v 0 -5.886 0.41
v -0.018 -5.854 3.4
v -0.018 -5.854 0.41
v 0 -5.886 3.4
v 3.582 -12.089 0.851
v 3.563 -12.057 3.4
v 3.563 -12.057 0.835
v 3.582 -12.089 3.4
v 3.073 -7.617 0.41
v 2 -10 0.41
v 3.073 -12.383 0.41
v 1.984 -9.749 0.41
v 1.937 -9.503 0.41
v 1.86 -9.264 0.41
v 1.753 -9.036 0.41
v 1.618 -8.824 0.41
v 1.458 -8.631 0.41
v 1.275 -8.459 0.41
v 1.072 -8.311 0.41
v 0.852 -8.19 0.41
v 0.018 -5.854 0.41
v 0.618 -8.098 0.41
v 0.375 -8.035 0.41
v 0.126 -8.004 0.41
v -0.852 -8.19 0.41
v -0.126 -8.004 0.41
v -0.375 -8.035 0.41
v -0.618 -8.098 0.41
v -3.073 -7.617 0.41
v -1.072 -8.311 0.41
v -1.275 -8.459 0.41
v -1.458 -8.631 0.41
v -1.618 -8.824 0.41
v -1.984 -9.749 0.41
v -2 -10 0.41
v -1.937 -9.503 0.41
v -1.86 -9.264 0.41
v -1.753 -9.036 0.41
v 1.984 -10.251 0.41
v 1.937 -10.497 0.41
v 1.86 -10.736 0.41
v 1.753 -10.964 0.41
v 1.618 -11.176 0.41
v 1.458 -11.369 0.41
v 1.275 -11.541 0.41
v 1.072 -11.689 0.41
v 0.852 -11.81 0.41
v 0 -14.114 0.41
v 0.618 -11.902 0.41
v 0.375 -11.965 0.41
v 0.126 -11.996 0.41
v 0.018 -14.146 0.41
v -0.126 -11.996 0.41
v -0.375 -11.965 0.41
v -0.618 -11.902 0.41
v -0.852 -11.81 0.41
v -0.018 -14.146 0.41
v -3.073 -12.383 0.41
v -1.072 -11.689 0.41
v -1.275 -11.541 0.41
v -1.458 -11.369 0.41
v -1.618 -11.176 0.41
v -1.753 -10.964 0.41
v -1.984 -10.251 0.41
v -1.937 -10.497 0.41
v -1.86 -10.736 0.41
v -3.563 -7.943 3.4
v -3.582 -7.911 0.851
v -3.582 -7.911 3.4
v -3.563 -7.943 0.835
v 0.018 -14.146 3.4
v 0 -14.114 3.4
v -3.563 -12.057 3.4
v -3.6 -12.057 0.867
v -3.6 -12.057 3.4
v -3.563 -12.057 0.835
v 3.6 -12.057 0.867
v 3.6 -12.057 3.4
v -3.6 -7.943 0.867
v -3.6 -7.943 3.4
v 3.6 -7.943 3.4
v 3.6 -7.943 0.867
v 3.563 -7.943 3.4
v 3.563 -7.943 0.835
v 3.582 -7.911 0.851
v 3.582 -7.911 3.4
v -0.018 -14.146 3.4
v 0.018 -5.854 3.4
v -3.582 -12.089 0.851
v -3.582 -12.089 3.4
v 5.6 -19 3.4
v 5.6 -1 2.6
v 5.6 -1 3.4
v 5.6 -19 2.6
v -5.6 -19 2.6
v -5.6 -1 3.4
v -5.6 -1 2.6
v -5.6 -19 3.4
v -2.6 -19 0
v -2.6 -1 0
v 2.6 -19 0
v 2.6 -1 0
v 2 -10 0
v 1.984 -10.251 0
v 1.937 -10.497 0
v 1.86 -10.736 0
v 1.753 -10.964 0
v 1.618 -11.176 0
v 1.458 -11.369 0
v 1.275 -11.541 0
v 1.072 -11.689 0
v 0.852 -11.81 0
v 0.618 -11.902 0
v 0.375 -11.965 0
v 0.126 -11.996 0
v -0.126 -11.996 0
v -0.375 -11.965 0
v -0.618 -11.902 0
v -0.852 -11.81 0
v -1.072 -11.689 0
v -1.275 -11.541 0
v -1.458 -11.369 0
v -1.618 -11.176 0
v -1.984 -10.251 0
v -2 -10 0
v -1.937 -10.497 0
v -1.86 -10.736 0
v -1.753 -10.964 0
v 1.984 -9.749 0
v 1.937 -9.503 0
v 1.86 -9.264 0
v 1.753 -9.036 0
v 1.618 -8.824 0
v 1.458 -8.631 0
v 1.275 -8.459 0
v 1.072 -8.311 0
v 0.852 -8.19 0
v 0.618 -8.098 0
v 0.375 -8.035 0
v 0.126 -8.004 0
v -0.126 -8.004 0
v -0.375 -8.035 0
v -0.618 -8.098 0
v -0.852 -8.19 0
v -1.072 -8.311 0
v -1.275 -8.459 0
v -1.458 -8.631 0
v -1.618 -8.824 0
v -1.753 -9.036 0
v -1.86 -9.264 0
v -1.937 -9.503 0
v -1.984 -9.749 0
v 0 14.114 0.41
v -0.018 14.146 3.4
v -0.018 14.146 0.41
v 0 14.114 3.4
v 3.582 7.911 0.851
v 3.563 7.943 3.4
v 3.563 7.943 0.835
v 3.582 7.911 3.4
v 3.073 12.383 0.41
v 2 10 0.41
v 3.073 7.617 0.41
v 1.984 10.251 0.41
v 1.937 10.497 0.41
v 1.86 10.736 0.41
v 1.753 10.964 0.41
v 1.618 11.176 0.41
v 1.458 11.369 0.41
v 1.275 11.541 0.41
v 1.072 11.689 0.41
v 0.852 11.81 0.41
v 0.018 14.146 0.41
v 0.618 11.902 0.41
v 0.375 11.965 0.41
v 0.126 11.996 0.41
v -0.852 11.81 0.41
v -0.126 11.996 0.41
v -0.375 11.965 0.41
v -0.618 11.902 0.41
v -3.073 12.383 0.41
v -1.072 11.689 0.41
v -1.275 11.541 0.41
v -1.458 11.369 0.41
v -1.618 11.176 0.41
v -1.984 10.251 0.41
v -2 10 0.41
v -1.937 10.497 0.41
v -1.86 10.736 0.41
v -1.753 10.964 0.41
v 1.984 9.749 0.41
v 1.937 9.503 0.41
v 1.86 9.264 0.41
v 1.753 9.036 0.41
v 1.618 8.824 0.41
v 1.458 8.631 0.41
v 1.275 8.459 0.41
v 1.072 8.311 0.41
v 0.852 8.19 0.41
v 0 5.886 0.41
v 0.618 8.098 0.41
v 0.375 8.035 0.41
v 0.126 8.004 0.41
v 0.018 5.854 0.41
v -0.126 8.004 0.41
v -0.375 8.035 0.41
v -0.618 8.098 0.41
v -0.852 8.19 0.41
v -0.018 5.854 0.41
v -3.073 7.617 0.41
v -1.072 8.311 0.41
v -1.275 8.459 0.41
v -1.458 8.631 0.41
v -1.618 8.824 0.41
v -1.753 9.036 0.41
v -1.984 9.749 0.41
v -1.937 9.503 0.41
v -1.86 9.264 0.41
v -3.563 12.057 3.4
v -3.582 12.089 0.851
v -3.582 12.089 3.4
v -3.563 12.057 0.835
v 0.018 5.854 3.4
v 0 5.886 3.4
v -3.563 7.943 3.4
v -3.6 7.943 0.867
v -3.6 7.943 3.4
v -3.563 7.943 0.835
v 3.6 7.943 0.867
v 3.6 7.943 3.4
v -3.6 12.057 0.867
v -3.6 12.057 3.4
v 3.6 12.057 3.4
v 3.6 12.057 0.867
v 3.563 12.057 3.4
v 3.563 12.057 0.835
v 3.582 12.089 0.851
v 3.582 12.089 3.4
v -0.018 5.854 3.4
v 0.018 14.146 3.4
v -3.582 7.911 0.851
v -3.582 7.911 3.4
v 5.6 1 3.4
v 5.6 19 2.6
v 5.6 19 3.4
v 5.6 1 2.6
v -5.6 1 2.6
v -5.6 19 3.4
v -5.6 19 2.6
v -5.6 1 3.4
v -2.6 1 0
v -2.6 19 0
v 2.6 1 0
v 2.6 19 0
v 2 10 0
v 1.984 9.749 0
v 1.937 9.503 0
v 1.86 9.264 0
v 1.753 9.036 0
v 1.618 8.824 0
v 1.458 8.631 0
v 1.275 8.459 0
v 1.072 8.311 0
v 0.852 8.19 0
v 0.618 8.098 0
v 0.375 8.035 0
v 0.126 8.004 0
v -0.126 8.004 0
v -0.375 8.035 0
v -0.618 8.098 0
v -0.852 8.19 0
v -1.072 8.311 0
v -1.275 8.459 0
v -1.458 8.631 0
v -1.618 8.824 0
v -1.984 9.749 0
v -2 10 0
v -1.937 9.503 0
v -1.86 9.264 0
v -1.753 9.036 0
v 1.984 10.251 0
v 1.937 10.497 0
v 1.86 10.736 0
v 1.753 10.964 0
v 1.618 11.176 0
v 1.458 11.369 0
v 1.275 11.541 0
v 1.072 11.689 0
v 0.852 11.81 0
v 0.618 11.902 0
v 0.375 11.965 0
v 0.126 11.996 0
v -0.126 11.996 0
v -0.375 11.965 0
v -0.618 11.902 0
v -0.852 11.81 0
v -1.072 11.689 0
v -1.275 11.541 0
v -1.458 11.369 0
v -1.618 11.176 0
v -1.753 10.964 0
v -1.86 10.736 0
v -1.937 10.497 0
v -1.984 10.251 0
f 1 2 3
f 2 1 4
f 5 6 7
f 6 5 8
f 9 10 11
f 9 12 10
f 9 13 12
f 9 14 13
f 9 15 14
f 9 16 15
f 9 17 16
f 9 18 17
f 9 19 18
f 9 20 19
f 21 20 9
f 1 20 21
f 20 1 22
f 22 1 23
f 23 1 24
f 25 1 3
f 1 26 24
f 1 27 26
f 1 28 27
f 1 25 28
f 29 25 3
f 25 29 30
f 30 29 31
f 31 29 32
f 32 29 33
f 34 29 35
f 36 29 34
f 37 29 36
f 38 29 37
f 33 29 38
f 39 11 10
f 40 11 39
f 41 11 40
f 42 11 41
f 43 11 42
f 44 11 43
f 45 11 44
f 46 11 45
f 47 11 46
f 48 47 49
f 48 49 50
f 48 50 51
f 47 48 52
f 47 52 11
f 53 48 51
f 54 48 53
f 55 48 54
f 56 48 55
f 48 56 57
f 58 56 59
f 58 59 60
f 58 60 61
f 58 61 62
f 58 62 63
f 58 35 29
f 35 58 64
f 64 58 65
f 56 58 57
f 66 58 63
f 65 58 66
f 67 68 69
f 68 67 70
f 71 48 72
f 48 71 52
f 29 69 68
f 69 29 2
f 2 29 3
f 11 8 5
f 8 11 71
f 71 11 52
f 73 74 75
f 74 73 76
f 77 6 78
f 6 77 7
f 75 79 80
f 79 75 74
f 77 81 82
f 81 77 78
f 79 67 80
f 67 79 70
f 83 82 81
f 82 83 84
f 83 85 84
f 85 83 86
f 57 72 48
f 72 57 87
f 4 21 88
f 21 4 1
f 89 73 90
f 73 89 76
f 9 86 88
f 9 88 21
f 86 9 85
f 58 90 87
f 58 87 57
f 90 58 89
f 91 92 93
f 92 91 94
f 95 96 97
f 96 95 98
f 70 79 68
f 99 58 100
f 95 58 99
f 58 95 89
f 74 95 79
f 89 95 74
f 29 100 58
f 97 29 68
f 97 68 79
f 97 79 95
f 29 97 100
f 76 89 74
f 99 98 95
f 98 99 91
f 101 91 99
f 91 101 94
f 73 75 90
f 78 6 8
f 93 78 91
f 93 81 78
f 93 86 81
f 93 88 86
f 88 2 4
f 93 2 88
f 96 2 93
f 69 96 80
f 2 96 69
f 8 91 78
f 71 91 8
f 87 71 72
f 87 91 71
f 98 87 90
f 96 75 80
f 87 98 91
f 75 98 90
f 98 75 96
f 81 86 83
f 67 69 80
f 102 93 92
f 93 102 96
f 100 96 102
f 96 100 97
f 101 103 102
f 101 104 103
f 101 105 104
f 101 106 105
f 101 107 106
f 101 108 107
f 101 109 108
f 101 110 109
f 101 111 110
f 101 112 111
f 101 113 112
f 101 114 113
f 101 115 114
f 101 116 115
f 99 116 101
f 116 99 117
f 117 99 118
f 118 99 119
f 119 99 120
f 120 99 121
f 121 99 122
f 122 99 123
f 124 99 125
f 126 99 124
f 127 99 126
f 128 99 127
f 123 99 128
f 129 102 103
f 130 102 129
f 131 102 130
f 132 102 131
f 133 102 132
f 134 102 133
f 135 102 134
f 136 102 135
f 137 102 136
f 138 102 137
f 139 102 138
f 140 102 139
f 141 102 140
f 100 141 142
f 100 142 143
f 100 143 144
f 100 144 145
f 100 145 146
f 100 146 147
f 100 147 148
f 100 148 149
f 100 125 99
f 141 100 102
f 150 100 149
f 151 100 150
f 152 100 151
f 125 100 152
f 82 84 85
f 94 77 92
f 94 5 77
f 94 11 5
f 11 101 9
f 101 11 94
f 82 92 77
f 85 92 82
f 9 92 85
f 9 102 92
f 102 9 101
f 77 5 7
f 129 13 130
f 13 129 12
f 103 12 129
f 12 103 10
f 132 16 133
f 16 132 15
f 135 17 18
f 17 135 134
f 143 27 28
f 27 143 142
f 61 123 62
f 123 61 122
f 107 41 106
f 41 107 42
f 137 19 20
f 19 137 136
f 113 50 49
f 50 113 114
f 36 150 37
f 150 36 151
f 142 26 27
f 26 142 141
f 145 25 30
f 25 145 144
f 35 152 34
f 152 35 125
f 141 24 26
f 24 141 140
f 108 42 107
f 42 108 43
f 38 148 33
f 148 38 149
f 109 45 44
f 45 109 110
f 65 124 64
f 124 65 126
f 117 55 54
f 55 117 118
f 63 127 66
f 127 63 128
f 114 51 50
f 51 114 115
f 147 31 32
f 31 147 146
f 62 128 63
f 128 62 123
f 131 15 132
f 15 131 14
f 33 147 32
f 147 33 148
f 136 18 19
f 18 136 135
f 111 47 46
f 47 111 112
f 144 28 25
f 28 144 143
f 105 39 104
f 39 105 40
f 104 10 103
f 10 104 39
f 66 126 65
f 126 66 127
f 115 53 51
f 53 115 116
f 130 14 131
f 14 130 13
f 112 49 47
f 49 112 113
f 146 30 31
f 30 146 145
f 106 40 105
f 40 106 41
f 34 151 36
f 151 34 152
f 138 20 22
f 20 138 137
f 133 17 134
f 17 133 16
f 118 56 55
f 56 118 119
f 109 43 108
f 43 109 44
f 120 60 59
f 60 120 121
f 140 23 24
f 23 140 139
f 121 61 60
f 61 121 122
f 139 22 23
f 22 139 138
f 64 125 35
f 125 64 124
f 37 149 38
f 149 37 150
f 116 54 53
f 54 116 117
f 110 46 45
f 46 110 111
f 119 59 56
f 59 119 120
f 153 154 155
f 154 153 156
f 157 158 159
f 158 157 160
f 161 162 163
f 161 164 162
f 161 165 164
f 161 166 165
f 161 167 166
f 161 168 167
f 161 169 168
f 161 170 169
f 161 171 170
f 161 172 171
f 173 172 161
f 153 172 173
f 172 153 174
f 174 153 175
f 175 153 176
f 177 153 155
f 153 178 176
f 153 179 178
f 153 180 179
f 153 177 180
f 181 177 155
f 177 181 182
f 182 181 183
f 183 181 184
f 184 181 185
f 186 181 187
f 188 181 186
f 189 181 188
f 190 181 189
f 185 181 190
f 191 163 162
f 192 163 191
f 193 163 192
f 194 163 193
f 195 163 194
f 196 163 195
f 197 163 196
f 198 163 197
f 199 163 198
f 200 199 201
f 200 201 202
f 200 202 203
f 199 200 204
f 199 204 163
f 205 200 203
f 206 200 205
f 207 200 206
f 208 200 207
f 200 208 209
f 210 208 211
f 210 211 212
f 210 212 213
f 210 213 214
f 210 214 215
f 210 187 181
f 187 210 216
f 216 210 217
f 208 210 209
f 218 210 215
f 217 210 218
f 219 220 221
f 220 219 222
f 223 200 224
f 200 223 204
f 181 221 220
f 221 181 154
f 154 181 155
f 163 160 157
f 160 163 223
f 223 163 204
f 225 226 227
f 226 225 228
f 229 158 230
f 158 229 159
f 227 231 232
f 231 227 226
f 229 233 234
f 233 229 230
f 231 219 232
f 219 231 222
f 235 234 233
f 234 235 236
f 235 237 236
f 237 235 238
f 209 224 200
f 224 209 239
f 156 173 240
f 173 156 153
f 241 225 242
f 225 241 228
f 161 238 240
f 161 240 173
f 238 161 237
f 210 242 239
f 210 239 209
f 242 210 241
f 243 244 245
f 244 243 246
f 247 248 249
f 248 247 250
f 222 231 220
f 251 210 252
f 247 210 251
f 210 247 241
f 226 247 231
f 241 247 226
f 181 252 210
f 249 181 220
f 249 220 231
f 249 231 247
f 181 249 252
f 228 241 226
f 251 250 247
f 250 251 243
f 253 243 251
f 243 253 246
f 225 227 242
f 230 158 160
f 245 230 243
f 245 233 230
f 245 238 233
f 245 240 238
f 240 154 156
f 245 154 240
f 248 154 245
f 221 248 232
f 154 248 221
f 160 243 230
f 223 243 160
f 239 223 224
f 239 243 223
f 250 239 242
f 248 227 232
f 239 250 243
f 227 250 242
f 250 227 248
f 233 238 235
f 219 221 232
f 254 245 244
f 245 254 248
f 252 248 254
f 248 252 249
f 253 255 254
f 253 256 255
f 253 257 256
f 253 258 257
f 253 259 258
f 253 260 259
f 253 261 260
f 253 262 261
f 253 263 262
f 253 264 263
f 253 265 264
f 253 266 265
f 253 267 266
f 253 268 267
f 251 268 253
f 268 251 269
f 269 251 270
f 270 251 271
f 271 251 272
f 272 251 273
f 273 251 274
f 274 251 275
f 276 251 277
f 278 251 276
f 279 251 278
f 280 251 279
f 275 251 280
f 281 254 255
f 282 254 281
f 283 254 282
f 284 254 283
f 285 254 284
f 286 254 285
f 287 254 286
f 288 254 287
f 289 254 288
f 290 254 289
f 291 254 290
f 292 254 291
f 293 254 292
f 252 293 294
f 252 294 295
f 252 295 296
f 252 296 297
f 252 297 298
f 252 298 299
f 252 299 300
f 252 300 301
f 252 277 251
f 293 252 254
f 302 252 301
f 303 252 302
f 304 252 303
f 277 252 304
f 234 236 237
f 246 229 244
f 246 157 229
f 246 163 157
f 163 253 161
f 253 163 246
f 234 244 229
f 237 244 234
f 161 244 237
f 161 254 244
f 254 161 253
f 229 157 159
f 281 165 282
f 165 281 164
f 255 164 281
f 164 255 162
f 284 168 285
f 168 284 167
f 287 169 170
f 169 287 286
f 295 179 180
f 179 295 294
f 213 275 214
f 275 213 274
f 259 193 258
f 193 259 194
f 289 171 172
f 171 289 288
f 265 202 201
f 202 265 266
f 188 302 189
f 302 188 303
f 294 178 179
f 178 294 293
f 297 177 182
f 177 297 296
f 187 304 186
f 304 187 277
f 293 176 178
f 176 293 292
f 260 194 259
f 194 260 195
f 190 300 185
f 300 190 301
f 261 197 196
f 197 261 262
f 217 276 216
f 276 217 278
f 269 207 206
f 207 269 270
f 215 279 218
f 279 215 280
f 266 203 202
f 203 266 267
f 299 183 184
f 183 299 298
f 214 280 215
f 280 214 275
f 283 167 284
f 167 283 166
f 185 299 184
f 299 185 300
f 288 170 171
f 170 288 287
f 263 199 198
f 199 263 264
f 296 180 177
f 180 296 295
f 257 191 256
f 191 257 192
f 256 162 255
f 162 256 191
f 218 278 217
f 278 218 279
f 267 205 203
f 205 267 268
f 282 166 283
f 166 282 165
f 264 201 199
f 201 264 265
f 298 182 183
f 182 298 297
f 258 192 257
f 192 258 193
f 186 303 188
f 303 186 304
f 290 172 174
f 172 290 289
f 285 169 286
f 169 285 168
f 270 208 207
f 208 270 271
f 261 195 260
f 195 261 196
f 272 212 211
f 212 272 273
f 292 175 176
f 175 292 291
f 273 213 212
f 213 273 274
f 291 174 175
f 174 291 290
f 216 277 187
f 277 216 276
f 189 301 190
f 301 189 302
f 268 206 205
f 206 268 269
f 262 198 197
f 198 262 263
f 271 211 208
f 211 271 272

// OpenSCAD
/*
 * Customizable nut holder for t-slot
 * by cdw, published Jul 21, 2014
 * https://www.thingiverse.com/thing:353938
 */

//CUSTOMIZER VARIABLES

//Nut width, from flat side to flat side
nut_width = 7.2;

//Nut depth, the thickness of the nut
// nut_depth = 2.2; // original design of  cdw
nut_depth = 3;  // in our case

//How you want the nut oriented
nut_rotation = 30; //[0:Pointy to sides, 30:Flat to sides]

//The thickness of the washer, set to zero to exclude the washer
washer_thick = 0;

//The radius of the washer
washer_rad = 5;

//The radius of the shaft of the screw, in case the nut doesn't penetrate the bottom of the holder
screw_rad = 2.0;

//The length of the holder
total_nut_length = 18; // 16; 

//The total width of the t-slot, at the top of the slot
slot_width = 11.2; //11.5;


//The height of the t-slot at the very edges, usually pretty small
slot_edge_height = .8;

//The total height of the t-slot, in the middle
slot_total_height = 3.4;

//How far the flat bit at the bottom of the t-slot is from the edges
slot_middle_offset = 3.0;

//How many nuts to make in the x direction
nut_num_x = 1;

//How many nuts to make in the y direction
nut_num_y = 2; // 10

module box(w,h,d) {
	scale ([w,h,d]) cube(1, true);
}
module hexagon(height, depth) {
	boxWidth=height/1.75;
	rotate([0,0,nut_rotation])
	union(){
		box(boxWidth, height, depth);
		rotate([0,0,60]) box(boxWidth, height, depth);
		rotate([0,0,-60]) box(boxWidth, height, depth);
	}
}

module nut() {
	translate([0,0,slot_total_height]) 
	difference() {
		translate([-0.5*slot_width, -0.5*total_nut_length, 0]) 
			rotate([270,0,0]) 
			linear_extrude(height=total_nut_length) 
			polygon([[0,0], 
					 [slot_width, 0], 
					 [slot_width, slot_edge_height], 
					 [slot_width-slot_middle_offset, slot_total_height], 
					 [slot_middle_offset, slot_total_height], 
					 [0, slot_edge_height]]);
		translate([0,0,-washer_thick+0.01]) cylinder(r=washer_rad, h=washer_thick, $fn=100);
		translate([0,0,-slot_total_height-0.01]) cylinder(r=screw_rad, h=slot_total_height+0.02, $fn=50);
		translate([0,0,-washer_thick-0.5*nut_depth+0.01]) hexagon(nut_width, nut_depth);
	}
}


for(x=[0:nut_num_x-1]) for(y=[0:nut_num_y-1]) {
	translate([-0.5*(nut_num_x-1)*(total_nut_length+2), -0.5*(nut_num_y-1)*(total_nut_length+2), 0])
	translate([x*(total_nut_length+2), y*(total_nut_length+2), 0]) 
	nut();
}
